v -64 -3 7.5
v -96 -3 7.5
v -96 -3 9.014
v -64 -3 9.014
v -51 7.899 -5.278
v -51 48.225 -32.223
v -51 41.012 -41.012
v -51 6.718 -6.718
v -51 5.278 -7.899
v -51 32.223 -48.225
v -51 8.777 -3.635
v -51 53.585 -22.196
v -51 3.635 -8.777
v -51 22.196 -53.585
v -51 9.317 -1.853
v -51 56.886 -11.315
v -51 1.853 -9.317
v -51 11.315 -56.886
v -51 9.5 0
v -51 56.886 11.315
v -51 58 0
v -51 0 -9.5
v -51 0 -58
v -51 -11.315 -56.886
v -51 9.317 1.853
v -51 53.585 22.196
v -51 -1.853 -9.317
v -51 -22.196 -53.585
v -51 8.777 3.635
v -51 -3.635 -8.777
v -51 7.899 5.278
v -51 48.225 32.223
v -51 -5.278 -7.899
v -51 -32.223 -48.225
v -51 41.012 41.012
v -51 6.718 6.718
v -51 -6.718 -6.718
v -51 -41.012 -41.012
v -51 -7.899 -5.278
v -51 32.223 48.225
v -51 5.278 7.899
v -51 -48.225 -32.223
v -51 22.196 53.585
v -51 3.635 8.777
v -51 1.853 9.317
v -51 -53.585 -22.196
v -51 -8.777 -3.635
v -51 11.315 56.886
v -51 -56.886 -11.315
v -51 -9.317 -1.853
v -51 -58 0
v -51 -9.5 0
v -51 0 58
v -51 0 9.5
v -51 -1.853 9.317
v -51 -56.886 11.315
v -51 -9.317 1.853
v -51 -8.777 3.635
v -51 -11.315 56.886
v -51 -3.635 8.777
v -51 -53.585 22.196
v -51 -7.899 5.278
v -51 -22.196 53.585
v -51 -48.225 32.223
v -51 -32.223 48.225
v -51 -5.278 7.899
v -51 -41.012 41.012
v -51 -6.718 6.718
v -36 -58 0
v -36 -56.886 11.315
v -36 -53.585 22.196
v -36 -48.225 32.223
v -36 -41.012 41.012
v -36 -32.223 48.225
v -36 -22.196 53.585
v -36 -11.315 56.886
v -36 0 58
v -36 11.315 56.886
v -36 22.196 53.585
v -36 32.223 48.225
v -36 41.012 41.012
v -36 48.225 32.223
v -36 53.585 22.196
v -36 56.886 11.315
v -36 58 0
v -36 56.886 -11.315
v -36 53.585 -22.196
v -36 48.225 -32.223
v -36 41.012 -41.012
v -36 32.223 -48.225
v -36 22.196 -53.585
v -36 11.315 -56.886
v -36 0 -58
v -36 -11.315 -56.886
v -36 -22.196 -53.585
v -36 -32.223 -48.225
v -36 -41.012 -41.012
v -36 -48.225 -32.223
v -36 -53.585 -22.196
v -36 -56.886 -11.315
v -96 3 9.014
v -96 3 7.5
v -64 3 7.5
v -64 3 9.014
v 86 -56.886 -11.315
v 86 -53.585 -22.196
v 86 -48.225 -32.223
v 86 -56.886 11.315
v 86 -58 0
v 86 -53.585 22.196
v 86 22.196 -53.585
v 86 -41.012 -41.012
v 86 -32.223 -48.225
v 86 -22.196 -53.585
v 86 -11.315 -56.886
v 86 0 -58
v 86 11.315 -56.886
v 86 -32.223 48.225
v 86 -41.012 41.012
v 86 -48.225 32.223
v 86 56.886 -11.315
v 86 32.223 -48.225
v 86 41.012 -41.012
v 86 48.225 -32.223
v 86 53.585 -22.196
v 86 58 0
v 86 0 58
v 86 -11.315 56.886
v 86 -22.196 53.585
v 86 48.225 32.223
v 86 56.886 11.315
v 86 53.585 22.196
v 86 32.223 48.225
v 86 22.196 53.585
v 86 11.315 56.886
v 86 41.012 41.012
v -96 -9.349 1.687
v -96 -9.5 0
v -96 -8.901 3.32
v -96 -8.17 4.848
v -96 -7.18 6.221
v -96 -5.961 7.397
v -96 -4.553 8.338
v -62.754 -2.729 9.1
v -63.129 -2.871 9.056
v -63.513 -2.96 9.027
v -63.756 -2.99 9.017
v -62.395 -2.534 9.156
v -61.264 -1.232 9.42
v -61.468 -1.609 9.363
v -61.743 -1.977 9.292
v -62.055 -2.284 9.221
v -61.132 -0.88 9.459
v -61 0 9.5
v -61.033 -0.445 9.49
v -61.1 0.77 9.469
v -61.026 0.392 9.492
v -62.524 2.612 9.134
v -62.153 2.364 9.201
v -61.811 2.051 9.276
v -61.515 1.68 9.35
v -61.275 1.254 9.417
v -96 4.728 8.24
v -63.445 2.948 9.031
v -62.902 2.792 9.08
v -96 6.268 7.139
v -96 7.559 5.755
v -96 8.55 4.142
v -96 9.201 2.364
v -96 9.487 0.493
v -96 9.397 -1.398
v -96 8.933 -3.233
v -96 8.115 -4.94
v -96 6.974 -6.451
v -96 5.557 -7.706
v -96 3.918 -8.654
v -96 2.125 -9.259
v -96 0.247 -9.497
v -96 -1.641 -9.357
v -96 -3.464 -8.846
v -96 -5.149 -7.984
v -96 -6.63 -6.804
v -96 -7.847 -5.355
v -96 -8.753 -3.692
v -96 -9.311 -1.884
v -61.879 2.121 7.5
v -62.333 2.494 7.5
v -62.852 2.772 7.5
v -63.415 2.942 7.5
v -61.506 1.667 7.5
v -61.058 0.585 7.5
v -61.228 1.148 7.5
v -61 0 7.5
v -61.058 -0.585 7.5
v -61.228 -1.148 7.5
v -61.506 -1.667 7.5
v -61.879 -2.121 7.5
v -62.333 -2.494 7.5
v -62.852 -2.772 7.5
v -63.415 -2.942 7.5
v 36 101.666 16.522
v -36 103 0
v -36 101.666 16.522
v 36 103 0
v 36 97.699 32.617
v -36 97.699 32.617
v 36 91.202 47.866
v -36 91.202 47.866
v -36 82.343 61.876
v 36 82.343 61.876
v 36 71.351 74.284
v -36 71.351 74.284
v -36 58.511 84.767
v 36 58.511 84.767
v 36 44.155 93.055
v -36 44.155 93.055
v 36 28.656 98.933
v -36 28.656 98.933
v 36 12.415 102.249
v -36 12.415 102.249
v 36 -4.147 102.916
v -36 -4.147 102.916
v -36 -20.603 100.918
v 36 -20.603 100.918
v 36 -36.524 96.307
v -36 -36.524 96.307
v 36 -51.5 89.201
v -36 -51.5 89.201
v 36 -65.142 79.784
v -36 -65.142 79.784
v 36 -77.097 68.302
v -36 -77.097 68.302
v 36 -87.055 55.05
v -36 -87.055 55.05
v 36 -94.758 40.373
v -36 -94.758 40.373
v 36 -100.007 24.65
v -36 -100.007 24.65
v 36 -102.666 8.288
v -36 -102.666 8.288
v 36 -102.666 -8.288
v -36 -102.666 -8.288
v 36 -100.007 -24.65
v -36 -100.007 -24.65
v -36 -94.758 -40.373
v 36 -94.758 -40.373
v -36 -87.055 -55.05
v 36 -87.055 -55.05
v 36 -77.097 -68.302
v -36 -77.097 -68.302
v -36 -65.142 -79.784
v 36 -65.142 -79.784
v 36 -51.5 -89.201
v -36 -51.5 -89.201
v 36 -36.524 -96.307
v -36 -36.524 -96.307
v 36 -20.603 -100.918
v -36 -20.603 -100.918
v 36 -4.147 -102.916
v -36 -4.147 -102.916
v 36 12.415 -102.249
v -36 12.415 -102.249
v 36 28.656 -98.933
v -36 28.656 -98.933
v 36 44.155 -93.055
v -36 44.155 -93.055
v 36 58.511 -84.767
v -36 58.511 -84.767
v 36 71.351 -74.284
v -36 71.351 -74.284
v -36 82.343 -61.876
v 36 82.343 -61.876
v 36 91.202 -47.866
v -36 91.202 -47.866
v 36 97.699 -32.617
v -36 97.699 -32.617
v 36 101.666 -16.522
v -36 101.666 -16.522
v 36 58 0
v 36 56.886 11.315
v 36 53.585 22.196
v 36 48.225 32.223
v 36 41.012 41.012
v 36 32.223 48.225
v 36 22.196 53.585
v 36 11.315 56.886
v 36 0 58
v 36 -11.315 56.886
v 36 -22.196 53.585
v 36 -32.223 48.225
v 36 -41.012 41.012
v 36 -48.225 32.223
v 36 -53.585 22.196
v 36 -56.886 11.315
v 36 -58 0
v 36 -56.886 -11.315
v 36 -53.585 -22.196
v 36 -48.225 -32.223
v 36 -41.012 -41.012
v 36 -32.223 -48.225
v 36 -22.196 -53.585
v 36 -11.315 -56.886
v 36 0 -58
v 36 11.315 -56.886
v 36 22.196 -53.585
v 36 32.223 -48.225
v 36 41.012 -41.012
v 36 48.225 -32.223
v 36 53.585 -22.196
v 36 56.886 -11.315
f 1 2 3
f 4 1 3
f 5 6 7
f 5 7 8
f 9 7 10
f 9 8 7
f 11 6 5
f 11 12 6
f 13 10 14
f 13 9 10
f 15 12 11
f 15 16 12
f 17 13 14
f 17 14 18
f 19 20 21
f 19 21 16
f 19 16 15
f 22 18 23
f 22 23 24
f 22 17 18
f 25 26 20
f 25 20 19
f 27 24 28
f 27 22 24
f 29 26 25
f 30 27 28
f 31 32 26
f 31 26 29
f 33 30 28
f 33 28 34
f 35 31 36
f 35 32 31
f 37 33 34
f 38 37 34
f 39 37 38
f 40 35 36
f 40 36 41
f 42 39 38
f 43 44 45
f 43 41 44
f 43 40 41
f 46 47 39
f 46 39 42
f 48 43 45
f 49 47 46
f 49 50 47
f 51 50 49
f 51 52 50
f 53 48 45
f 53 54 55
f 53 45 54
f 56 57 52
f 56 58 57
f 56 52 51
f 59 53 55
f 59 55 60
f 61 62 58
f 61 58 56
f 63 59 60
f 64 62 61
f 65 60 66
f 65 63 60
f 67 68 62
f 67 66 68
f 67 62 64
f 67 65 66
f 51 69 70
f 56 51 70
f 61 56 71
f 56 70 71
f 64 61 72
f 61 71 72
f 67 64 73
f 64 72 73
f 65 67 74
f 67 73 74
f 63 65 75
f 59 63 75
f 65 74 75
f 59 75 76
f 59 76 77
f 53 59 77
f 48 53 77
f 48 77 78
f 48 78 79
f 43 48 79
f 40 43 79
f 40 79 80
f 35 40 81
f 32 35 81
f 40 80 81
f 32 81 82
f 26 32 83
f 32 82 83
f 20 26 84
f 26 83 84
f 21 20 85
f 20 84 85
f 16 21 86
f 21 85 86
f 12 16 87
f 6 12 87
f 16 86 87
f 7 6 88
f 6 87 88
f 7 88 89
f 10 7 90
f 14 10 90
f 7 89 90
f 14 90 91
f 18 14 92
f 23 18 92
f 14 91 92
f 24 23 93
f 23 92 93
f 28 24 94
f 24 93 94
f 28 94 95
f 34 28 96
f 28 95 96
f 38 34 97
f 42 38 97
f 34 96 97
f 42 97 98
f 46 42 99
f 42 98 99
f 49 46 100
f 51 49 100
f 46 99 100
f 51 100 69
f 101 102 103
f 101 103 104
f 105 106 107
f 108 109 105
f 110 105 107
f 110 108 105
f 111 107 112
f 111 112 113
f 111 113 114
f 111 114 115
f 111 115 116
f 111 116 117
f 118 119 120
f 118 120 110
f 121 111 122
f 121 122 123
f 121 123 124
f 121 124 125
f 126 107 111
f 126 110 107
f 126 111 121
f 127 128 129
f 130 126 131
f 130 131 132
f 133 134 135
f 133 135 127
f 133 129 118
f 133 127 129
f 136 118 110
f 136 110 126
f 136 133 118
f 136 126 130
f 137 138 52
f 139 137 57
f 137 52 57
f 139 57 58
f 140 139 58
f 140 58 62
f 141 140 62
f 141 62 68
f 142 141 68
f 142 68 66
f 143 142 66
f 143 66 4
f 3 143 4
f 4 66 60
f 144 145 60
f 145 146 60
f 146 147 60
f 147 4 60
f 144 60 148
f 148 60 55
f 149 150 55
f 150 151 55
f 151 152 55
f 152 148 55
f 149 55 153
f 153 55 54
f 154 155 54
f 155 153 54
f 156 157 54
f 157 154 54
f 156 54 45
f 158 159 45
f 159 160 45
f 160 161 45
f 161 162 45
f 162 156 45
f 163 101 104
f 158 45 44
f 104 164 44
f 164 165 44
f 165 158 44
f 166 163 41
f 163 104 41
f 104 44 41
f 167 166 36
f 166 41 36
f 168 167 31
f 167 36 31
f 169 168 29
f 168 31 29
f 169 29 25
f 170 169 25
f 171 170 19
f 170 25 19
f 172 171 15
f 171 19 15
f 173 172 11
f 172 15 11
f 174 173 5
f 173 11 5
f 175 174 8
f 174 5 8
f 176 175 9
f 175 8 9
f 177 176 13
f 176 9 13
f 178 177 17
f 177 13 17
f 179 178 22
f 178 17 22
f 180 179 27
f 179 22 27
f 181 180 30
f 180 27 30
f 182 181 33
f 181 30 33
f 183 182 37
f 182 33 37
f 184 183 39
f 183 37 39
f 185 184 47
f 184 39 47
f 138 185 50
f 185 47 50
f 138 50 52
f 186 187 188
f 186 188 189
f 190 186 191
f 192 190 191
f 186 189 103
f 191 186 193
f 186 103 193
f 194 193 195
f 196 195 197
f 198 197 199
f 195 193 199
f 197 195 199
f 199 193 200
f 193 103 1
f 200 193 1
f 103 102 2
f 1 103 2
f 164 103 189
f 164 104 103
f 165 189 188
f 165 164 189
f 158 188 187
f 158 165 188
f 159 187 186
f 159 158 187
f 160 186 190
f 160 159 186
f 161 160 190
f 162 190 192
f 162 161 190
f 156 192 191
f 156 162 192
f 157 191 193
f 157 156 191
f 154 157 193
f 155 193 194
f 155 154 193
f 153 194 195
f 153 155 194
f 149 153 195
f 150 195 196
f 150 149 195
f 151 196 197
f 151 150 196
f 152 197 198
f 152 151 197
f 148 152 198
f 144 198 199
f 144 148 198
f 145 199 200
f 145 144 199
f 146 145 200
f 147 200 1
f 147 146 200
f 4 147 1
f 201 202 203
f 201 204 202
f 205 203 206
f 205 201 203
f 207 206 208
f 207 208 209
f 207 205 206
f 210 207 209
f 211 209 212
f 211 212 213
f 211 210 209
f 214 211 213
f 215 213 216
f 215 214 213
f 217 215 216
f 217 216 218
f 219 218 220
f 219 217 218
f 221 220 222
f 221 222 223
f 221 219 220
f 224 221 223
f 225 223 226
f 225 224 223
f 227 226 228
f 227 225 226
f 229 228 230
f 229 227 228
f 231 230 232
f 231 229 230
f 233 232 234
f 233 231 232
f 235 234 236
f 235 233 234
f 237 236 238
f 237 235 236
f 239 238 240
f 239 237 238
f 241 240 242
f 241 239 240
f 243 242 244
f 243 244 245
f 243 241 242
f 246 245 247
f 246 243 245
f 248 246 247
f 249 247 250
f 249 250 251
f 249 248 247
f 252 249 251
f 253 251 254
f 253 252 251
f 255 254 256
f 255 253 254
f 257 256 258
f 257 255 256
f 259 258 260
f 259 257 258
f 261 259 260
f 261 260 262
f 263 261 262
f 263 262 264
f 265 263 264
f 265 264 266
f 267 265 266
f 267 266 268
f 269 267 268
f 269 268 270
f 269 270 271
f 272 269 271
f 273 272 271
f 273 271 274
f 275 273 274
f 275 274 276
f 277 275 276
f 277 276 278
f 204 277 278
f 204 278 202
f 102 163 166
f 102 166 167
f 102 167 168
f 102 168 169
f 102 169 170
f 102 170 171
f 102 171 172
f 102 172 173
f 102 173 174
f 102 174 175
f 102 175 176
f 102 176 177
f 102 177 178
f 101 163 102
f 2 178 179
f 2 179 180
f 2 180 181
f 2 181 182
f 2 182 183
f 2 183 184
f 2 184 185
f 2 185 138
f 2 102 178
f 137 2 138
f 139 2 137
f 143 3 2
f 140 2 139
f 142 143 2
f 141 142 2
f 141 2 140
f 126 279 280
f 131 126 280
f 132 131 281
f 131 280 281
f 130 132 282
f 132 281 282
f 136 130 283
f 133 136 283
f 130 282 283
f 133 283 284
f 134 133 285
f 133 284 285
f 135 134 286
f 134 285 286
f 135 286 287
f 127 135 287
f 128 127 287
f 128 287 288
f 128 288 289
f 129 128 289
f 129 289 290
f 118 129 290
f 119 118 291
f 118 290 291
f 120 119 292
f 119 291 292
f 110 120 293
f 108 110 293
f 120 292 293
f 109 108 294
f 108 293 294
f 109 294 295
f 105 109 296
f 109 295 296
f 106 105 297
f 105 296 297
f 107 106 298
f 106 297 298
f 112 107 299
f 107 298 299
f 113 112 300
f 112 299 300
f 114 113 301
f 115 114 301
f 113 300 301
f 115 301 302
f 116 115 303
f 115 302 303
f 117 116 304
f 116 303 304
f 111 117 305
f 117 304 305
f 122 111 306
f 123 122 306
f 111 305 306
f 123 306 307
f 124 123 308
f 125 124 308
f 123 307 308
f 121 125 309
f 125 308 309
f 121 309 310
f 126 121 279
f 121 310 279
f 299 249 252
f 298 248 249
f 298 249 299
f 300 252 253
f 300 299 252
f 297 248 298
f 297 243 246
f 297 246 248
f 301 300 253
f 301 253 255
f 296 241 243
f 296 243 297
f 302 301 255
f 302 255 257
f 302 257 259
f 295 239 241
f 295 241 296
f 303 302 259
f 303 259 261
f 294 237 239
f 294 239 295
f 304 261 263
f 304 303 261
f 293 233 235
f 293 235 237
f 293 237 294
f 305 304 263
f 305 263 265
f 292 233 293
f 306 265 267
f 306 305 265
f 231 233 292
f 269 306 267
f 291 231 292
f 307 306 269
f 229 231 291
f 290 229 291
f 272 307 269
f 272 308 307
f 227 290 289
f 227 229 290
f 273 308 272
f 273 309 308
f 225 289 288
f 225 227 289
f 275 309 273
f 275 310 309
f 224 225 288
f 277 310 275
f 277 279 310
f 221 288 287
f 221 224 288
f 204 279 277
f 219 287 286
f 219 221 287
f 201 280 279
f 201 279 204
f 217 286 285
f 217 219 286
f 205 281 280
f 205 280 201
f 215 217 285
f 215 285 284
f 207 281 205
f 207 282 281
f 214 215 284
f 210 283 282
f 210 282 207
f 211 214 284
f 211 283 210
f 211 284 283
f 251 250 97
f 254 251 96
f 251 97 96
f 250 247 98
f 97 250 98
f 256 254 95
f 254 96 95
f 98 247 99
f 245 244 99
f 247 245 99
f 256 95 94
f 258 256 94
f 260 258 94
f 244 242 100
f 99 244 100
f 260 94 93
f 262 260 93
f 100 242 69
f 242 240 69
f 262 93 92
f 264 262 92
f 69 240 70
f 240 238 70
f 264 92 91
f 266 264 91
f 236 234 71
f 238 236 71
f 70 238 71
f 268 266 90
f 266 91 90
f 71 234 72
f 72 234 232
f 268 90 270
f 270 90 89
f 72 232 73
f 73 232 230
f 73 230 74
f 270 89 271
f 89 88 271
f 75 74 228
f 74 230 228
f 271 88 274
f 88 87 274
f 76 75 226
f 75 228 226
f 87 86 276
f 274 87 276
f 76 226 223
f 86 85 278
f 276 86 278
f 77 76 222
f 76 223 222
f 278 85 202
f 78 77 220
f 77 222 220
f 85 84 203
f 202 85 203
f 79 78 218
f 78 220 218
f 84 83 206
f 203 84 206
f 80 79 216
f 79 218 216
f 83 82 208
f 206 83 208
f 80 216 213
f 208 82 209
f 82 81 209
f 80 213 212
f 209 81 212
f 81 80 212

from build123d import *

# Parameters (mm, degrees)
F0_R     = 103
F1_DEPTH = 36
F2_R     = 58
F3_DEPTH = 50
F4_R     = 58
F5_DEPTH = 15
F6_R     = 9.5
F7_DEPTH = 45
F8_W     = 6
F8_H     = 4
F9_DEPTH = 35
F10_R    = 2.9999


# Not quite as in the source:
# - a fillet or chamfer is up to 0.001 mm smaller than in the source, because OpenCascade refuses the exact size


with BuildPart() as f1:
    # F0 (on Right) → F1 (new body, symmetric)
    with BuildSketch(Plane.YZ):
        Circle(F0_R)
    extrude(amount=F1_DEPTH, both=True)

    # F2 (on face) → F3 (join)
    with BuildSketch(Plane.YZ.offset(36)):
        Circle(F2_R)
    extrude(amount=F3_DEPTH)

    # F4 (on face) → F5 (join)
    with BuildSketch(Plane(origin=(-36, 0, 0), x_dir=(0, -1, 0), z_dir=(-1, 0, 0))):
        Circle(F4_R)
    extrude(amount=F5_DEPTH)

    # F6 (on face) → F7 (join)
    with BuildSketch(Plane(origin=(-51, 0, 0), x_dir=(0, -1, 0), z_dir=(-1, 0, 0))):
        Circle(F6_R)
    extrude(amount=F7_DEPTH)

    # F8 (on face) → F9 (cut)
    with BuildSketch(Plane(origin=(-96, 0, 0), x_dir=(0, -1, 0), z_dir=(-1, 0, 0))):
        with Locations((0, 9.5)):
            Rectangle(F8_W, F8_H)
    extrude(amount=-F9_DEPTH, mode=Mode.SUBTRACT)

    # F10 (radius 3 in the source; OpenCascade refuses exactly that, so slightly less here)
    f10_edges = [f1.edges().sort_by_distance(p)[0] for p in [
        (-61, 3, 8.256939),
        (-61, -3, 8.256939),
    ]]
    fillet(f10_edges, radius=F10_R)


solid = f1.part
